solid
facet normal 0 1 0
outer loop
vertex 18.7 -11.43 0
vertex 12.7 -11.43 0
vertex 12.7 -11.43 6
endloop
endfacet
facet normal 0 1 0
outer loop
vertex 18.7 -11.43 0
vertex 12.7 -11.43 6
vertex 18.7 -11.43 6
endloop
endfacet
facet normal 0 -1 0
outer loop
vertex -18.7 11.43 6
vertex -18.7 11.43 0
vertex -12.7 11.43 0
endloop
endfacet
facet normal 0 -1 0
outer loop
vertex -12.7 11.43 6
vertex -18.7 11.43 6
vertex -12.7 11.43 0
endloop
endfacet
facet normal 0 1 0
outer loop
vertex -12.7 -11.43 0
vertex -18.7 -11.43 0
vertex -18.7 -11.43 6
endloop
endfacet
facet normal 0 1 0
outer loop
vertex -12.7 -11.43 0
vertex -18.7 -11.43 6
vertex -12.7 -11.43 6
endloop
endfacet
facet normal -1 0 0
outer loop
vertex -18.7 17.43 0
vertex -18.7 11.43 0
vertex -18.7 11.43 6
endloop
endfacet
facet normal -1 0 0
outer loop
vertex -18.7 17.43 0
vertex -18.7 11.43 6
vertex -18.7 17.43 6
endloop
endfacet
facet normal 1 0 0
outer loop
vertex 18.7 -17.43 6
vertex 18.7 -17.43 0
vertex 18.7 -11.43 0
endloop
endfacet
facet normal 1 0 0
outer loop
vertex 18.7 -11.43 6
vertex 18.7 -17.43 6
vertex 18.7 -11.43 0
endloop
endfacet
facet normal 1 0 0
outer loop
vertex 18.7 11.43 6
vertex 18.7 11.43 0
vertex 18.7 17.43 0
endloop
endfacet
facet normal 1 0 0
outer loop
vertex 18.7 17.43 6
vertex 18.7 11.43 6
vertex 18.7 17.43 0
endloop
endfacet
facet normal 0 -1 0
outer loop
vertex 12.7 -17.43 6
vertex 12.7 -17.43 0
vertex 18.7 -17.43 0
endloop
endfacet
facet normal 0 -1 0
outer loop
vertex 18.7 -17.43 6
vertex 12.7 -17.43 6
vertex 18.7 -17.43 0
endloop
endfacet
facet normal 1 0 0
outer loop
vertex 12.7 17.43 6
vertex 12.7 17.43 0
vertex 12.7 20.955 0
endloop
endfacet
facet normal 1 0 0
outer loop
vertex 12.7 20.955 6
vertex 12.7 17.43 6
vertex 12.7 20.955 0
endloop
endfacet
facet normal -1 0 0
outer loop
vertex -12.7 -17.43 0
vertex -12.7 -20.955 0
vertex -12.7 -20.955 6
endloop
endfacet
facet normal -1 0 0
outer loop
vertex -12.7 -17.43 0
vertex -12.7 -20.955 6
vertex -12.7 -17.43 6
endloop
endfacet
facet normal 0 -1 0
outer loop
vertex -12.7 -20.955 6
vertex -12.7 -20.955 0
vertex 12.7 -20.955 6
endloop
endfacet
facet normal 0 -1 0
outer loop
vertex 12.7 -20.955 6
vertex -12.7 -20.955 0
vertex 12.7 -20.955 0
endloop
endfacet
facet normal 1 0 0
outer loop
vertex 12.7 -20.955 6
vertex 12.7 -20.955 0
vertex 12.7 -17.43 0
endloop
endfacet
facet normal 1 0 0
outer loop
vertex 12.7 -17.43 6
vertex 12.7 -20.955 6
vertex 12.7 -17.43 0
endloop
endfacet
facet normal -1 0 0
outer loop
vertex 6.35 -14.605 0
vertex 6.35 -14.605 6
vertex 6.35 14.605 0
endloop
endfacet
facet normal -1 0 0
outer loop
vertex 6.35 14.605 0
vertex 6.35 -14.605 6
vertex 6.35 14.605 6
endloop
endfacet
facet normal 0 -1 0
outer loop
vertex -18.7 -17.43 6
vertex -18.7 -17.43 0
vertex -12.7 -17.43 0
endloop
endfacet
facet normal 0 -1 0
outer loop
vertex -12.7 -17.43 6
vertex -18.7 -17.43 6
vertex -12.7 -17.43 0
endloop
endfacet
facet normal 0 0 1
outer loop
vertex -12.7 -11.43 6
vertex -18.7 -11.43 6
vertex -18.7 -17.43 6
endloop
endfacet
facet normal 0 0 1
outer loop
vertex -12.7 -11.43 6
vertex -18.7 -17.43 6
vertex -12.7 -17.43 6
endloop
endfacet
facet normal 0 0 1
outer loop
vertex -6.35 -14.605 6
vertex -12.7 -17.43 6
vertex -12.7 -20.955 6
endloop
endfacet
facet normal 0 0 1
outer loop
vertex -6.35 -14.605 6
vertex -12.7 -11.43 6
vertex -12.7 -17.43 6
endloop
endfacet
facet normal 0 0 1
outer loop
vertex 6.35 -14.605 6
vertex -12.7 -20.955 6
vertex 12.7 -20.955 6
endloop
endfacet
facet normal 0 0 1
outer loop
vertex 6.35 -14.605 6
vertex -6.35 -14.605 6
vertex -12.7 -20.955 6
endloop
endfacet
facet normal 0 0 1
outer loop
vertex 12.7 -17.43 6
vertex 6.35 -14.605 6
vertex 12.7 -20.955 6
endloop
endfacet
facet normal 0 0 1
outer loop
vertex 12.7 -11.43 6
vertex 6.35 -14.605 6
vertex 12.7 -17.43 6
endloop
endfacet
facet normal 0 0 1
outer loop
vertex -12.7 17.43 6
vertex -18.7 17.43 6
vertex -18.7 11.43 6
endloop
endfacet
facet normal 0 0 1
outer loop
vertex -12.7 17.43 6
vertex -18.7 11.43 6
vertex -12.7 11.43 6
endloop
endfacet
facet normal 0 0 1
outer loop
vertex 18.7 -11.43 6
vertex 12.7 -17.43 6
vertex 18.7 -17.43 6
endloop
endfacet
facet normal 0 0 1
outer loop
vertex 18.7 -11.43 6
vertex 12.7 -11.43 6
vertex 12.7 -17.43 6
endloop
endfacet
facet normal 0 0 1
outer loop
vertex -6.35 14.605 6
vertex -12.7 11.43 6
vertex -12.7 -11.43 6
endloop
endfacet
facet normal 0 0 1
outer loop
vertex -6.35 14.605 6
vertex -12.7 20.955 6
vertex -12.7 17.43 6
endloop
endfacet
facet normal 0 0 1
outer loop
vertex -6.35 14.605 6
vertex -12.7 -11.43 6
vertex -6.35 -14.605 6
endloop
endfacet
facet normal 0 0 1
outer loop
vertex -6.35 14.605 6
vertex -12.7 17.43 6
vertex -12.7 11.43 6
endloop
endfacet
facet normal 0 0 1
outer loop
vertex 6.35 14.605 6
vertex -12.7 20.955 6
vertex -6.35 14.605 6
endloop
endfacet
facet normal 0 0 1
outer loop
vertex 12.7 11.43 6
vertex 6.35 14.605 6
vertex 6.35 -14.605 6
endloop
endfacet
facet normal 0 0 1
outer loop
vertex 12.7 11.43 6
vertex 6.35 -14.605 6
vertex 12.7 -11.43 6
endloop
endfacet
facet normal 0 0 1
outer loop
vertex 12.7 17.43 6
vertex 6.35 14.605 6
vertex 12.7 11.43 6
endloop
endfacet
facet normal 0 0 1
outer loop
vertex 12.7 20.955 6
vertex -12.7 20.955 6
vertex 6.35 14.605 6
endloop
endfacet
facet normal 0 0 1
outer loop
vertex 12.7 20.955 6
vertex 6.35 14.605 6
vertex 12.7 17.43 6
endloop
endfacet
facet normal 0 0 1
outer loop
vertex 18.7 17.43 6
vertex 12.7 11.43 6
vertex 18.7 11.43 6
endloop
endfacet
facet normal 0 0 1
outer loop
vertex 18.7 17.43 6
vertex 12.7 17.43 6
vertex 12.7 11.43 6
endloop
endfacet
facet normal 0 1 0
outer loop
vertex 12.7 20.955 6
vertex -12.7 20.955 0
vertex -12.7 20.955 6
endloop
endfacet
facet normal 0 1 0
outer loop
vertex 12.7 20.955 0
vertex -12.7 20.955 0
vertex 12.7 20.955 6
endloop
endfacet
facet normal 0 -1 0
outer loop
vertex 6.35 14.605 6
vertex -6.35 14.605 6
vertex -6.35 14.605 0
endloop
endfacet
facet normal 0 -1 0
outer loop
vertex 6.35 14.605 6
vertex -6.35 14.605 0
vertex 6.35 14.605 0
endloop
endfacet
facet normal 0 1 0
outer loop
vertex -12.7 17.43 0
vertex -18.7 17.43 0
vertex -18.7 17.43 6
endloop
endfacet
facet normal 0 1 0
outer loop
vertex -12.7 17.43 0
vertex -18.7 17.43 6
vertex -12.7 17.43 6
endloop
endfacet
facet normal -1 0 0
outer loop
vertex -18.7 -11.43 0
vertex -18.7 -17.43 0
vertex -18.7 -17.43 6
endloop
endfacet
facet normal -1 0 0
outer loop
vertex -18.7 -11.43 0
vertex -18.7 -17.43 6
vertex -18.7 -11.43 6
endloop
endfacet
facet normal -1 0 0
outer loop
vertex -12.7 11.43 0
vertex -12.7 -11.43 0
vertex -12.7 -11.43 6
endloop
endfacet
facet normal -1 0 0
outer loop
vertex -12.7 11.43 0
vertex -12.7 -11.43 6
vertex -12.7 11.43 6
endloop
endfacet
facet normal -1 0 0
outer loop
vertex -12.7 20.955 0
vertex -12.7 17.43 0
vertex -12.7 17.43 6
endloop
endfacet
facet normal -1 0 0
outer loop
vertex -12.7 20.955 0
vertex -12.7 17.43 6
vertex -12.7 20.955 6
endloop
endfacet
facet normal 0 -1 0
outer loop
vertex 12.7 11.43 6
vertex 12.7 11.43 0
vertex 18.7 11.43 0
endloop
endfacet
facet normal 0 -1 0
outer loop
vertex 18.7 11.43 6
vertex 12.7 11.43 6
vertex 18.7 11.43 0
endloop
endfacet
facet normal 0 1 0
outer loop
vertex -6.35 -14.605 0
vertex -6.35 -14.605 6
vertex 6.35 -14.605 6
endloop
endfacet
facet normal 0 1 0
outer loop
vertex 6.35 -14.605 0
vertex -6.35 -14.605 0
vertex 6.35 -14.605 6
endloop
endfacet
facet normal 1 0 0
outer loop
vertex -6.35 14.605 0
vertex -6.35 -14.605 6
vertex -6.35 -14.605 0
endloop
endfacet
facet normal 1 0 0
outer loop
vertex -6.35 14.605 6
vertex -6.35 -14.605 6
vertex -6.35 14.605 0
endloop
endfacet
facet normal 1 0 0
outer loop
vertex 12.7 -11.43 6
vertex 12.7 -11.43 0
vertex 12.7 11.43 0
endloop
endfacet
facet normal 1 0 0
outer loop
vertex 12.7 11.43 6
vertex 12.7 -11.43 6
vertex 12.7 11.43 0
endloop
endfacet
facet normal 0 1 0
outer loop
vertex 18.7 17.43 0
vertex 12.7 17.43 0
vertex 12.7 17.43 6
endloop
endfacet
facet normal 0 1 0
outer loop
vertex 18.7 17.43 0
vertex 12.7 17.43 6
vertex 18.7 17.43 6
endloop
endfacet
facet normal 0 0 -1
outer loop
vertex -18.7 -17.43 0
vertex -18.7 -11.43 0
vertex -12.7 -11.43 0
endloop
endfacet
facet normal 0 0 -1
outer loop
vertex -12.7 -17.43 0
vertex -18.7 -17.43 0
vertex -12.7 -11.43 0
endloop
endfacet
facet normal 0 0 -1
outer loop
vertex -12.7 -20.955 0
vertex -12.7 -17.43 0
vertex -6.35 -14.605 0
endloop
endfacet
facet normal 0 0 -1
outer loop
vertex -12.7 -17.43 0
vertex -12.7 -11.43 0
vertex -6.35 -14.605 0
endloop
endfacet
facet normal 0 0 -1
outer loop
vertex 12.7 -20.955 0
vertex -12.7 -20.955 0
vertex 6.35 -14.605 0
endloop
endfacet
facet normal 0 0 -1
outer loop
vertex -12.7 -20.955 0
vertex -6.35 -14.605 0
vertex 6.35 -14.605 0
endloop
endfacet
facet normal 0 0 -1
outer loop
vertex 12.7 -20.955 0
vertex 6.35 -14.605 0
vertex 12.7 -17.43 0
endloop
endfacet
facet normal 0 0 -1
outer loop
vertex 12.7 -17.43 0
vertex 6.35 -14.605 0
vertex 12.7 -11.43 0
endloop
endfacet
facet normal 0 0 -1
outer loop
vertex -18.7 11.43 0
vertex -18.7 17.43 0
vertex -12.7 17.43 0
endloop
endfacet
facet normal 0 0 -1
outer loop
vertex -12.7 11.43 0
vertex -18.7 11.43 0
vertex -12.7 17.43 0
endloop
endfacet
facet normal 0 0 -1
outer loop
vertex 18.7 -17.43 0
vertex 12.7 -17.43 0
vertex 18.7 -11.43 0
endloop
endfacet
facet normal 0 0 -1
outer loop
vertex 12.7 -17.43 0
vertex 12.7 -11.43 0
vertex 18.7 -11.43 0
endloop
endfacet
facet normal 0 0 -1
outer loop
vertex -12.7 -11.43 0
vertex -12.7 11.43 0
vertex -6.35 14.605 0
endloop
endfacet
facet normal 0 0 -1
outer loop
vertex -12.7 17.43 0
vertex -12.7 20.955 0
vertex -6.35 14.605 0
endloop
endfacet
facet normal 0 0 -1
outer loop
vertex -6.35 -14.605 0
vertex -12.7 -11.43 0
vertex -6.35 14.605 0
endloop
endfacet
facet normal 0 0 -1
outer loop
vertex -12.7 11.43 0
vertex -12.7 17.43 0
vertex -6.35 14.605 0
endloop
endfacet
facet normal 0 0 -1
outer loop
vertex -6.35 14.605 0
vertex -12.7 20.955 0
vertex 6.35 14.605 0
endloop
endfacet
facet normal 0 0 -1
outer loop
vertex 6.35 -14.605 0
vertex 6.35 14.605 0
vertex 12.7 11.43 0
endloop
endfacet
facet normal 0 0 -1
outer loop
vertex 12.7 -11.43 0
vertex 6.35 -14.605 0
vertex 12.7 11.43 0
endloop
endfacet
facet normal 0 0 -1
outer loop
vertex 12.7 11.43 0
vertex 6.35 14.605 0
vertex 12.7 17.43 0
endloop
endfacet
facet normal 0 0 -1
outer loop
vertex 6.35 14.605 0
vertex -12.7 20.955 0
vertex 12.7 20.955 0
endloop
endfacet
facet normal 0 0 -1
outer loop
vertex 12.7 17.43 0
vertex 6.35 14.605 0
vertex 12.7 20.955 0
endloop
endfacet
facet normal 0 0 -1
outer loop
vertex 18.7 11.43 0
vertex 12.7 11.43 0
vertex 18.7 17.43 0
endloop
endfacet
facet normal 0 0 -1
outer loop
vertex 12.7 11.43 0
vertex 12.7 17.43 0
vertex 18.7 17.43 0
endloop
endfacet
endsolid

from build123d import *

# Parameters (mm, degrees)
SKETCH1_W           = 6
SKETCH1_H           = 6
SKETCH1_W_2         = 25.4
SKETCH1_H_2         = 41.91
BOSS_EXTRUDE1_DEPTH = 6
SKETCH2_W           = 12.7
SKETCH2_H           = 29.21
CUT_EXTRUDE1_DEPTH  = 29.719366724


with BuildPart() as part:
    # Sketch1 → Boss-Extrude1 (new body)
    with BuildSketch(Plane.XY):
        with Locations((-15.7, 14.43)):
            Rectangle(SKETCH1_W, SKETCH1_H)
        Rectangle(SKETCH1_W_2, SKETCH1_H_2)
        with Locations((-15.7, -14.43)):
            Rectangle(SKETCH1_W, SKETCH1_H)
        with Locations((15.7, -14.43)):
            Rectangle(SKETCH1_W, SKETCH1_H)
        with Locations((15.7, 14.43)):
            Rectangle(SKETCH1_W, SKETCH1_H)
    extrude(amount=BOSS_EXTRUDE1_DEPTH)

    # Sketch2 → Cut-Extrude1 (cut, through all)
    with BuildSketch(Plane.XY.offset(6)):
        Rectangle(SKETCH2_W, SKETCH2_H)
    extrude(amount=-CUT_EXTRUDE1_DEPTH, mode=Mode.SUBTRACT)


solid = part.part
